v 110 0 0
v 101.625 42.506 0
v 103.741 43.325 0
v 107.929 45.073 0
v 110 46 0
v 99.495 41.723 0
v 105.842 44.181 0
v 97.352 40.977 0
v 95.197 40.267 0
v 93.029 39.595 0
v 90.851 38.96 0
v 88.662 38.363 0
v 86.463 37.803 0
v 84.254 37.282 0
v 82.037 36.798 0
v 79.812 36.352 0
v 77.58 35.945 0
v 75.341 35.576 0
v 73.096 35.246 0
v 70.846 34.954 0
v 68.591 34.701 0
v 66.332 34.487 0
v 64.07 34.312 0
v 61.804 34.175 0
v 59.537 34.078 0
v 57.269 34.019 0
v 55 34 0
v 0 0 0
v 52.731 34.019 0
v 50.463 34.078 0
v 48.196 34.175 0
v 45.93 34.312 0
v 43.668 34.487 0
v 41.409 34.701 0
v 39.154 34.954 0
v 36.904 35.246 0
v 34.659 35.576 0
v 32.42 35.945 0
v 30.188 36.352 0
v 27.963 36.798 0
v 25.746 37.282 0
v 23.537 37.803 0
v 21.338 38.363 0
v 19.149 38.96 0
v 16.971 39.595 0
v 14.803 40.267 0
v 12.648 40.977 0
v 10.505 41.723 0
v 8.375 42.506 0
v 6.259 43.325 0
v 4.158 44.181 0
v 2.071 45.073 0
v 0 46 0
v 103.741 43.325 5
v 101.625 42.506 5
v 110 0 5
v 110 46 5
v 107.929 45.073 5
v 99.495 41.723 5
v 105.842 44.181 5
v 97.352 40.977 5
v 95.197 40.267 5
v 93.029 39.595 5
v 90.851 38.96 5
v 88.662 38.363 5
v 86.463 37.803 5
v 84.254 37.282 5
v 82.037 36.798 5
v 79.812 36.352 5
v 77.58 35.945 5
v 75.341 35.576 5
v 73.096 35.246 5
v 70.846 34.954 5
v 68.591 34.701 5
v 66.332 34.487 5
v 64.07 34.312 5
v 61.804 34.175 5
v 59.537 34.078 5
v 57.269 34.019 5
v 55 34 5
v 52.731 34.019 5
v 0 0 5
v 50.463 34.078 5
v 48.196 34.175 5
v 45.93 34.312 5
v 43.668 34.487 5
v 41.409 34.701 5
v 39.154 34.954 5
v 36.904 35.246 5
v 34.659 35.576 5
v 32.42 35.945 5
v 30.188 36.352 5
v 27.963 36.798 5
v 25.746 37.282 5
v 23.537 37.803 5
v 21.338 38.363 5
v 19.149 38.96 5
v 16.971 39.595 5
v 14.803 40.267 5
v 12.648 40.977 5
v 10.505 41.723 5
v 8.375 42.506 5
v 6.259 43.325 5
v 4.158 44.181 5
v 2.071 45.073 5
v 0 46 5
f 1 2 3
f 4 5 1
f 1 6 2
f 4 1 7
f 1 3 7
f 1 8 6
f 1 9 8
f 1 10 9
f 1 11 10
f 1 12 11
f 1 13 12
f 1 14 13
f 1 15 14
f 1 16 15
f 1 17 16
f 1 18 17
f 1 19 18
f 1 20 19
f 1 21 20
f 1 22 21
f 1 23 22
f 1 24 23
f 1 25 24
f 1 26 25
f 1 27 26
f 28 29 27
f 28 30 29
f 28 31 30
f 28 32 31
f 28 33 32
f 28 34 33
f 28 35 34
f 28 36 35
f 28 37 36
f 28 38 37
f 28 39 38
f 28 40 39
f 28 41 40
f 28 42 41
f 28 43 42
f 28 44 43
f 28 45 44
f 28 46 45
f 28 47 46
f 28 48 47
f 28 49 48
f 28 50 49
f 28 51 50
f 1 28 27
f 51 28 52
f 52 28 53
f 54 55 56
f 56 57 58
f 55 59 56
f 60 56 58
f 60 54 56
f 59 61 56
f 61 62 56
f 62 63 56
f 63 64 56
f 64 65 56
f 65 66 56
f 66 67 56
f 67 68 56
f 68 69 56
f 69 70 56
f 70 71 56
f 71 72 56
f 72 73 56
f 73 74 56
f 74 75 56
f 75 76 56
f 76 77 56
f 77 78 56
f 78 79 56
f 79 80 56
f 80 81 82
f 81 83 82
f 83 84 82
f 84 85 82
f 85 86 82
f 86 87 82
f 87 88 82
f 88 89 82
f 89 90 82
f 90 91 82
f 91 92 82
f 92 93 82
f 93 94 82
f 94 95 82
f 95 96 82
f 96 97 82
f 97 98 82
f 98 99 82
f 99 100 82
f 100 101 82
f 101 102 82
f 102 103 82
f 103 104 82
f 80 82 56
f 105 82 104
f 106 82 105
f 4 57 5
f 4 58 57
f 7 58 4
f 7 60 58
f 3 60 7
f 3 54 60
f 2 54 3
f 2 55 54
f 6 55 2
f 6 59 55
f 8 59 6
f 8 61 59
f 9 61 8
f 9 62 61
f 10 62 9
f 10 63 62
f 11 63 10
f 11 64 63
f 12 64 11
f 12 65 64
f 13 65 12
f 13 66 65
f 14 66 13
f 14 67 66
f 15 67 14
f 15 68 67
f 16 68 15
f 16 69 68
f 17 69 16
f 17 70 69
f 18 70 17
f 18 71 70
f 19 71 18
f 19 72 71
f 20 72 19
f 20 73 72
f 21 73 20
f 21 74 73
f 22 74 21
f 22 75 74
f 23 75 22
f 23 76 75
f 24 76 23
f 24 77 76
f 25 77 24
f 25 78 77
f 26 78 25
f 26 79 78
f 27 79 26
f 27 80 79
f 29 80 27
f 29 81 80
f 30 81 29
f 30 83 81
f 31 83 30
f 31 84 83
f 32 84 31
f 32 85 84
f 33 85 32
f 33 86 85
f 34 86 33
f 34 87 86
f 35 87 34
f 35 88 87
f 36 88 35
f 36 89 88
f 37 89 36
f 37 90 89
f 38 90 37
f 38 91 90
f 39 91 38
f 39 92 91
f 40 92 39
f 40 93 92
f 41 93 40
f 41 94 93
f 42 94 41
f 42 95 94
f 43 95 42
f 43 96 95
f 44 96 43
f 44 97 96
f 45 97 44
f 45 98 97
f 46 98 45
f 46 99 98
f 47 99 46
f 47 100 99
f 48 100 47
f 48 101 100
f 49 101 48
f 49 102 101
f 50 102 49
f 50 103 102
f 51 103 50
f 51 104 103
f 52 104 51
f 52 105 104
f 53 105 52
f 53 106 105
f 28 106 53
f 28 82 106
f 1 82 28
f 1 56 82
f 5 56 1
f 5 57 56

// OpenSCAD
$fn = 32;

// ----------------------------------------------------------------------
// Arc profile plate: notch, 53 points
// ----------------------------------------------------------------------

// --- parameters (mm) ---
bar_l = 110;              // bar length, X
bar_w = 46;               // bar width, Y
notch_depth = 12;         // depth of the arc notch at mid-span
arc_r = 132.04;           // radius of the notch arc
arc_angle = 49.23;        // notch arc angle, degrees
arc_step = 1;             // sampling step of the notch arc, degrees
plate_t = 5;              // plate thickness, Z
fit_tol = 0.05;           // declared fit tolerance (prompt contract)
free_tol = 0.2;           // declared free tolerance (prompt contract)

profile = [[0, 0], [110, 0], [110, 46], [107.929, 45.073], [105.842, 44.181], [103.741, 43.325], [101.625, 42.506], [99.495, 41.723], [97.352, 40.977], [95.197, 40.267], [93.029, 39.595], [90.851, 38.96], [88.662, 38.363], [86.463, 37.803], [84.254, 37.282], [82.037, 36.798], [79.812, 36.352], [77.58, 35.945], [75.341, 35.576], [73.096, 35.246], [70.846, 34.954], [68.591, 34.701], [66.332, 34.487], [64.07, 34.312], [61.804, 34.175], [59.537, 34.078], [57.269, 34.019], [55, 34], [52.731, 34.019], [50.463, 34.078], [48.196, 34.175], [45.93, 34.312], [43.668, 34.487], [41.409, 34.701], [39.154, 34.954], [36.904, 35.246], [34.659, 35.576], [32.42, 35.945], [30.188, 36.352], [27.963, 36.798], [25.746, 37.282], [23.537, 37.803], [21.338, 38.363], [19.149, 38.96], [16.971, 39.595], [14.803, 40.267], [12.648, 40.977], [10.505, 41.723], [8.375, 42.506], [6.259, 43.325], [4.158, 44.181], [2.071, 45.073], [0, 46]];  // primary outline, 53 points, counter clockwise

// --- the one profile operation ---
linear_extrude(height = plate_t) polygon(points = profile);
